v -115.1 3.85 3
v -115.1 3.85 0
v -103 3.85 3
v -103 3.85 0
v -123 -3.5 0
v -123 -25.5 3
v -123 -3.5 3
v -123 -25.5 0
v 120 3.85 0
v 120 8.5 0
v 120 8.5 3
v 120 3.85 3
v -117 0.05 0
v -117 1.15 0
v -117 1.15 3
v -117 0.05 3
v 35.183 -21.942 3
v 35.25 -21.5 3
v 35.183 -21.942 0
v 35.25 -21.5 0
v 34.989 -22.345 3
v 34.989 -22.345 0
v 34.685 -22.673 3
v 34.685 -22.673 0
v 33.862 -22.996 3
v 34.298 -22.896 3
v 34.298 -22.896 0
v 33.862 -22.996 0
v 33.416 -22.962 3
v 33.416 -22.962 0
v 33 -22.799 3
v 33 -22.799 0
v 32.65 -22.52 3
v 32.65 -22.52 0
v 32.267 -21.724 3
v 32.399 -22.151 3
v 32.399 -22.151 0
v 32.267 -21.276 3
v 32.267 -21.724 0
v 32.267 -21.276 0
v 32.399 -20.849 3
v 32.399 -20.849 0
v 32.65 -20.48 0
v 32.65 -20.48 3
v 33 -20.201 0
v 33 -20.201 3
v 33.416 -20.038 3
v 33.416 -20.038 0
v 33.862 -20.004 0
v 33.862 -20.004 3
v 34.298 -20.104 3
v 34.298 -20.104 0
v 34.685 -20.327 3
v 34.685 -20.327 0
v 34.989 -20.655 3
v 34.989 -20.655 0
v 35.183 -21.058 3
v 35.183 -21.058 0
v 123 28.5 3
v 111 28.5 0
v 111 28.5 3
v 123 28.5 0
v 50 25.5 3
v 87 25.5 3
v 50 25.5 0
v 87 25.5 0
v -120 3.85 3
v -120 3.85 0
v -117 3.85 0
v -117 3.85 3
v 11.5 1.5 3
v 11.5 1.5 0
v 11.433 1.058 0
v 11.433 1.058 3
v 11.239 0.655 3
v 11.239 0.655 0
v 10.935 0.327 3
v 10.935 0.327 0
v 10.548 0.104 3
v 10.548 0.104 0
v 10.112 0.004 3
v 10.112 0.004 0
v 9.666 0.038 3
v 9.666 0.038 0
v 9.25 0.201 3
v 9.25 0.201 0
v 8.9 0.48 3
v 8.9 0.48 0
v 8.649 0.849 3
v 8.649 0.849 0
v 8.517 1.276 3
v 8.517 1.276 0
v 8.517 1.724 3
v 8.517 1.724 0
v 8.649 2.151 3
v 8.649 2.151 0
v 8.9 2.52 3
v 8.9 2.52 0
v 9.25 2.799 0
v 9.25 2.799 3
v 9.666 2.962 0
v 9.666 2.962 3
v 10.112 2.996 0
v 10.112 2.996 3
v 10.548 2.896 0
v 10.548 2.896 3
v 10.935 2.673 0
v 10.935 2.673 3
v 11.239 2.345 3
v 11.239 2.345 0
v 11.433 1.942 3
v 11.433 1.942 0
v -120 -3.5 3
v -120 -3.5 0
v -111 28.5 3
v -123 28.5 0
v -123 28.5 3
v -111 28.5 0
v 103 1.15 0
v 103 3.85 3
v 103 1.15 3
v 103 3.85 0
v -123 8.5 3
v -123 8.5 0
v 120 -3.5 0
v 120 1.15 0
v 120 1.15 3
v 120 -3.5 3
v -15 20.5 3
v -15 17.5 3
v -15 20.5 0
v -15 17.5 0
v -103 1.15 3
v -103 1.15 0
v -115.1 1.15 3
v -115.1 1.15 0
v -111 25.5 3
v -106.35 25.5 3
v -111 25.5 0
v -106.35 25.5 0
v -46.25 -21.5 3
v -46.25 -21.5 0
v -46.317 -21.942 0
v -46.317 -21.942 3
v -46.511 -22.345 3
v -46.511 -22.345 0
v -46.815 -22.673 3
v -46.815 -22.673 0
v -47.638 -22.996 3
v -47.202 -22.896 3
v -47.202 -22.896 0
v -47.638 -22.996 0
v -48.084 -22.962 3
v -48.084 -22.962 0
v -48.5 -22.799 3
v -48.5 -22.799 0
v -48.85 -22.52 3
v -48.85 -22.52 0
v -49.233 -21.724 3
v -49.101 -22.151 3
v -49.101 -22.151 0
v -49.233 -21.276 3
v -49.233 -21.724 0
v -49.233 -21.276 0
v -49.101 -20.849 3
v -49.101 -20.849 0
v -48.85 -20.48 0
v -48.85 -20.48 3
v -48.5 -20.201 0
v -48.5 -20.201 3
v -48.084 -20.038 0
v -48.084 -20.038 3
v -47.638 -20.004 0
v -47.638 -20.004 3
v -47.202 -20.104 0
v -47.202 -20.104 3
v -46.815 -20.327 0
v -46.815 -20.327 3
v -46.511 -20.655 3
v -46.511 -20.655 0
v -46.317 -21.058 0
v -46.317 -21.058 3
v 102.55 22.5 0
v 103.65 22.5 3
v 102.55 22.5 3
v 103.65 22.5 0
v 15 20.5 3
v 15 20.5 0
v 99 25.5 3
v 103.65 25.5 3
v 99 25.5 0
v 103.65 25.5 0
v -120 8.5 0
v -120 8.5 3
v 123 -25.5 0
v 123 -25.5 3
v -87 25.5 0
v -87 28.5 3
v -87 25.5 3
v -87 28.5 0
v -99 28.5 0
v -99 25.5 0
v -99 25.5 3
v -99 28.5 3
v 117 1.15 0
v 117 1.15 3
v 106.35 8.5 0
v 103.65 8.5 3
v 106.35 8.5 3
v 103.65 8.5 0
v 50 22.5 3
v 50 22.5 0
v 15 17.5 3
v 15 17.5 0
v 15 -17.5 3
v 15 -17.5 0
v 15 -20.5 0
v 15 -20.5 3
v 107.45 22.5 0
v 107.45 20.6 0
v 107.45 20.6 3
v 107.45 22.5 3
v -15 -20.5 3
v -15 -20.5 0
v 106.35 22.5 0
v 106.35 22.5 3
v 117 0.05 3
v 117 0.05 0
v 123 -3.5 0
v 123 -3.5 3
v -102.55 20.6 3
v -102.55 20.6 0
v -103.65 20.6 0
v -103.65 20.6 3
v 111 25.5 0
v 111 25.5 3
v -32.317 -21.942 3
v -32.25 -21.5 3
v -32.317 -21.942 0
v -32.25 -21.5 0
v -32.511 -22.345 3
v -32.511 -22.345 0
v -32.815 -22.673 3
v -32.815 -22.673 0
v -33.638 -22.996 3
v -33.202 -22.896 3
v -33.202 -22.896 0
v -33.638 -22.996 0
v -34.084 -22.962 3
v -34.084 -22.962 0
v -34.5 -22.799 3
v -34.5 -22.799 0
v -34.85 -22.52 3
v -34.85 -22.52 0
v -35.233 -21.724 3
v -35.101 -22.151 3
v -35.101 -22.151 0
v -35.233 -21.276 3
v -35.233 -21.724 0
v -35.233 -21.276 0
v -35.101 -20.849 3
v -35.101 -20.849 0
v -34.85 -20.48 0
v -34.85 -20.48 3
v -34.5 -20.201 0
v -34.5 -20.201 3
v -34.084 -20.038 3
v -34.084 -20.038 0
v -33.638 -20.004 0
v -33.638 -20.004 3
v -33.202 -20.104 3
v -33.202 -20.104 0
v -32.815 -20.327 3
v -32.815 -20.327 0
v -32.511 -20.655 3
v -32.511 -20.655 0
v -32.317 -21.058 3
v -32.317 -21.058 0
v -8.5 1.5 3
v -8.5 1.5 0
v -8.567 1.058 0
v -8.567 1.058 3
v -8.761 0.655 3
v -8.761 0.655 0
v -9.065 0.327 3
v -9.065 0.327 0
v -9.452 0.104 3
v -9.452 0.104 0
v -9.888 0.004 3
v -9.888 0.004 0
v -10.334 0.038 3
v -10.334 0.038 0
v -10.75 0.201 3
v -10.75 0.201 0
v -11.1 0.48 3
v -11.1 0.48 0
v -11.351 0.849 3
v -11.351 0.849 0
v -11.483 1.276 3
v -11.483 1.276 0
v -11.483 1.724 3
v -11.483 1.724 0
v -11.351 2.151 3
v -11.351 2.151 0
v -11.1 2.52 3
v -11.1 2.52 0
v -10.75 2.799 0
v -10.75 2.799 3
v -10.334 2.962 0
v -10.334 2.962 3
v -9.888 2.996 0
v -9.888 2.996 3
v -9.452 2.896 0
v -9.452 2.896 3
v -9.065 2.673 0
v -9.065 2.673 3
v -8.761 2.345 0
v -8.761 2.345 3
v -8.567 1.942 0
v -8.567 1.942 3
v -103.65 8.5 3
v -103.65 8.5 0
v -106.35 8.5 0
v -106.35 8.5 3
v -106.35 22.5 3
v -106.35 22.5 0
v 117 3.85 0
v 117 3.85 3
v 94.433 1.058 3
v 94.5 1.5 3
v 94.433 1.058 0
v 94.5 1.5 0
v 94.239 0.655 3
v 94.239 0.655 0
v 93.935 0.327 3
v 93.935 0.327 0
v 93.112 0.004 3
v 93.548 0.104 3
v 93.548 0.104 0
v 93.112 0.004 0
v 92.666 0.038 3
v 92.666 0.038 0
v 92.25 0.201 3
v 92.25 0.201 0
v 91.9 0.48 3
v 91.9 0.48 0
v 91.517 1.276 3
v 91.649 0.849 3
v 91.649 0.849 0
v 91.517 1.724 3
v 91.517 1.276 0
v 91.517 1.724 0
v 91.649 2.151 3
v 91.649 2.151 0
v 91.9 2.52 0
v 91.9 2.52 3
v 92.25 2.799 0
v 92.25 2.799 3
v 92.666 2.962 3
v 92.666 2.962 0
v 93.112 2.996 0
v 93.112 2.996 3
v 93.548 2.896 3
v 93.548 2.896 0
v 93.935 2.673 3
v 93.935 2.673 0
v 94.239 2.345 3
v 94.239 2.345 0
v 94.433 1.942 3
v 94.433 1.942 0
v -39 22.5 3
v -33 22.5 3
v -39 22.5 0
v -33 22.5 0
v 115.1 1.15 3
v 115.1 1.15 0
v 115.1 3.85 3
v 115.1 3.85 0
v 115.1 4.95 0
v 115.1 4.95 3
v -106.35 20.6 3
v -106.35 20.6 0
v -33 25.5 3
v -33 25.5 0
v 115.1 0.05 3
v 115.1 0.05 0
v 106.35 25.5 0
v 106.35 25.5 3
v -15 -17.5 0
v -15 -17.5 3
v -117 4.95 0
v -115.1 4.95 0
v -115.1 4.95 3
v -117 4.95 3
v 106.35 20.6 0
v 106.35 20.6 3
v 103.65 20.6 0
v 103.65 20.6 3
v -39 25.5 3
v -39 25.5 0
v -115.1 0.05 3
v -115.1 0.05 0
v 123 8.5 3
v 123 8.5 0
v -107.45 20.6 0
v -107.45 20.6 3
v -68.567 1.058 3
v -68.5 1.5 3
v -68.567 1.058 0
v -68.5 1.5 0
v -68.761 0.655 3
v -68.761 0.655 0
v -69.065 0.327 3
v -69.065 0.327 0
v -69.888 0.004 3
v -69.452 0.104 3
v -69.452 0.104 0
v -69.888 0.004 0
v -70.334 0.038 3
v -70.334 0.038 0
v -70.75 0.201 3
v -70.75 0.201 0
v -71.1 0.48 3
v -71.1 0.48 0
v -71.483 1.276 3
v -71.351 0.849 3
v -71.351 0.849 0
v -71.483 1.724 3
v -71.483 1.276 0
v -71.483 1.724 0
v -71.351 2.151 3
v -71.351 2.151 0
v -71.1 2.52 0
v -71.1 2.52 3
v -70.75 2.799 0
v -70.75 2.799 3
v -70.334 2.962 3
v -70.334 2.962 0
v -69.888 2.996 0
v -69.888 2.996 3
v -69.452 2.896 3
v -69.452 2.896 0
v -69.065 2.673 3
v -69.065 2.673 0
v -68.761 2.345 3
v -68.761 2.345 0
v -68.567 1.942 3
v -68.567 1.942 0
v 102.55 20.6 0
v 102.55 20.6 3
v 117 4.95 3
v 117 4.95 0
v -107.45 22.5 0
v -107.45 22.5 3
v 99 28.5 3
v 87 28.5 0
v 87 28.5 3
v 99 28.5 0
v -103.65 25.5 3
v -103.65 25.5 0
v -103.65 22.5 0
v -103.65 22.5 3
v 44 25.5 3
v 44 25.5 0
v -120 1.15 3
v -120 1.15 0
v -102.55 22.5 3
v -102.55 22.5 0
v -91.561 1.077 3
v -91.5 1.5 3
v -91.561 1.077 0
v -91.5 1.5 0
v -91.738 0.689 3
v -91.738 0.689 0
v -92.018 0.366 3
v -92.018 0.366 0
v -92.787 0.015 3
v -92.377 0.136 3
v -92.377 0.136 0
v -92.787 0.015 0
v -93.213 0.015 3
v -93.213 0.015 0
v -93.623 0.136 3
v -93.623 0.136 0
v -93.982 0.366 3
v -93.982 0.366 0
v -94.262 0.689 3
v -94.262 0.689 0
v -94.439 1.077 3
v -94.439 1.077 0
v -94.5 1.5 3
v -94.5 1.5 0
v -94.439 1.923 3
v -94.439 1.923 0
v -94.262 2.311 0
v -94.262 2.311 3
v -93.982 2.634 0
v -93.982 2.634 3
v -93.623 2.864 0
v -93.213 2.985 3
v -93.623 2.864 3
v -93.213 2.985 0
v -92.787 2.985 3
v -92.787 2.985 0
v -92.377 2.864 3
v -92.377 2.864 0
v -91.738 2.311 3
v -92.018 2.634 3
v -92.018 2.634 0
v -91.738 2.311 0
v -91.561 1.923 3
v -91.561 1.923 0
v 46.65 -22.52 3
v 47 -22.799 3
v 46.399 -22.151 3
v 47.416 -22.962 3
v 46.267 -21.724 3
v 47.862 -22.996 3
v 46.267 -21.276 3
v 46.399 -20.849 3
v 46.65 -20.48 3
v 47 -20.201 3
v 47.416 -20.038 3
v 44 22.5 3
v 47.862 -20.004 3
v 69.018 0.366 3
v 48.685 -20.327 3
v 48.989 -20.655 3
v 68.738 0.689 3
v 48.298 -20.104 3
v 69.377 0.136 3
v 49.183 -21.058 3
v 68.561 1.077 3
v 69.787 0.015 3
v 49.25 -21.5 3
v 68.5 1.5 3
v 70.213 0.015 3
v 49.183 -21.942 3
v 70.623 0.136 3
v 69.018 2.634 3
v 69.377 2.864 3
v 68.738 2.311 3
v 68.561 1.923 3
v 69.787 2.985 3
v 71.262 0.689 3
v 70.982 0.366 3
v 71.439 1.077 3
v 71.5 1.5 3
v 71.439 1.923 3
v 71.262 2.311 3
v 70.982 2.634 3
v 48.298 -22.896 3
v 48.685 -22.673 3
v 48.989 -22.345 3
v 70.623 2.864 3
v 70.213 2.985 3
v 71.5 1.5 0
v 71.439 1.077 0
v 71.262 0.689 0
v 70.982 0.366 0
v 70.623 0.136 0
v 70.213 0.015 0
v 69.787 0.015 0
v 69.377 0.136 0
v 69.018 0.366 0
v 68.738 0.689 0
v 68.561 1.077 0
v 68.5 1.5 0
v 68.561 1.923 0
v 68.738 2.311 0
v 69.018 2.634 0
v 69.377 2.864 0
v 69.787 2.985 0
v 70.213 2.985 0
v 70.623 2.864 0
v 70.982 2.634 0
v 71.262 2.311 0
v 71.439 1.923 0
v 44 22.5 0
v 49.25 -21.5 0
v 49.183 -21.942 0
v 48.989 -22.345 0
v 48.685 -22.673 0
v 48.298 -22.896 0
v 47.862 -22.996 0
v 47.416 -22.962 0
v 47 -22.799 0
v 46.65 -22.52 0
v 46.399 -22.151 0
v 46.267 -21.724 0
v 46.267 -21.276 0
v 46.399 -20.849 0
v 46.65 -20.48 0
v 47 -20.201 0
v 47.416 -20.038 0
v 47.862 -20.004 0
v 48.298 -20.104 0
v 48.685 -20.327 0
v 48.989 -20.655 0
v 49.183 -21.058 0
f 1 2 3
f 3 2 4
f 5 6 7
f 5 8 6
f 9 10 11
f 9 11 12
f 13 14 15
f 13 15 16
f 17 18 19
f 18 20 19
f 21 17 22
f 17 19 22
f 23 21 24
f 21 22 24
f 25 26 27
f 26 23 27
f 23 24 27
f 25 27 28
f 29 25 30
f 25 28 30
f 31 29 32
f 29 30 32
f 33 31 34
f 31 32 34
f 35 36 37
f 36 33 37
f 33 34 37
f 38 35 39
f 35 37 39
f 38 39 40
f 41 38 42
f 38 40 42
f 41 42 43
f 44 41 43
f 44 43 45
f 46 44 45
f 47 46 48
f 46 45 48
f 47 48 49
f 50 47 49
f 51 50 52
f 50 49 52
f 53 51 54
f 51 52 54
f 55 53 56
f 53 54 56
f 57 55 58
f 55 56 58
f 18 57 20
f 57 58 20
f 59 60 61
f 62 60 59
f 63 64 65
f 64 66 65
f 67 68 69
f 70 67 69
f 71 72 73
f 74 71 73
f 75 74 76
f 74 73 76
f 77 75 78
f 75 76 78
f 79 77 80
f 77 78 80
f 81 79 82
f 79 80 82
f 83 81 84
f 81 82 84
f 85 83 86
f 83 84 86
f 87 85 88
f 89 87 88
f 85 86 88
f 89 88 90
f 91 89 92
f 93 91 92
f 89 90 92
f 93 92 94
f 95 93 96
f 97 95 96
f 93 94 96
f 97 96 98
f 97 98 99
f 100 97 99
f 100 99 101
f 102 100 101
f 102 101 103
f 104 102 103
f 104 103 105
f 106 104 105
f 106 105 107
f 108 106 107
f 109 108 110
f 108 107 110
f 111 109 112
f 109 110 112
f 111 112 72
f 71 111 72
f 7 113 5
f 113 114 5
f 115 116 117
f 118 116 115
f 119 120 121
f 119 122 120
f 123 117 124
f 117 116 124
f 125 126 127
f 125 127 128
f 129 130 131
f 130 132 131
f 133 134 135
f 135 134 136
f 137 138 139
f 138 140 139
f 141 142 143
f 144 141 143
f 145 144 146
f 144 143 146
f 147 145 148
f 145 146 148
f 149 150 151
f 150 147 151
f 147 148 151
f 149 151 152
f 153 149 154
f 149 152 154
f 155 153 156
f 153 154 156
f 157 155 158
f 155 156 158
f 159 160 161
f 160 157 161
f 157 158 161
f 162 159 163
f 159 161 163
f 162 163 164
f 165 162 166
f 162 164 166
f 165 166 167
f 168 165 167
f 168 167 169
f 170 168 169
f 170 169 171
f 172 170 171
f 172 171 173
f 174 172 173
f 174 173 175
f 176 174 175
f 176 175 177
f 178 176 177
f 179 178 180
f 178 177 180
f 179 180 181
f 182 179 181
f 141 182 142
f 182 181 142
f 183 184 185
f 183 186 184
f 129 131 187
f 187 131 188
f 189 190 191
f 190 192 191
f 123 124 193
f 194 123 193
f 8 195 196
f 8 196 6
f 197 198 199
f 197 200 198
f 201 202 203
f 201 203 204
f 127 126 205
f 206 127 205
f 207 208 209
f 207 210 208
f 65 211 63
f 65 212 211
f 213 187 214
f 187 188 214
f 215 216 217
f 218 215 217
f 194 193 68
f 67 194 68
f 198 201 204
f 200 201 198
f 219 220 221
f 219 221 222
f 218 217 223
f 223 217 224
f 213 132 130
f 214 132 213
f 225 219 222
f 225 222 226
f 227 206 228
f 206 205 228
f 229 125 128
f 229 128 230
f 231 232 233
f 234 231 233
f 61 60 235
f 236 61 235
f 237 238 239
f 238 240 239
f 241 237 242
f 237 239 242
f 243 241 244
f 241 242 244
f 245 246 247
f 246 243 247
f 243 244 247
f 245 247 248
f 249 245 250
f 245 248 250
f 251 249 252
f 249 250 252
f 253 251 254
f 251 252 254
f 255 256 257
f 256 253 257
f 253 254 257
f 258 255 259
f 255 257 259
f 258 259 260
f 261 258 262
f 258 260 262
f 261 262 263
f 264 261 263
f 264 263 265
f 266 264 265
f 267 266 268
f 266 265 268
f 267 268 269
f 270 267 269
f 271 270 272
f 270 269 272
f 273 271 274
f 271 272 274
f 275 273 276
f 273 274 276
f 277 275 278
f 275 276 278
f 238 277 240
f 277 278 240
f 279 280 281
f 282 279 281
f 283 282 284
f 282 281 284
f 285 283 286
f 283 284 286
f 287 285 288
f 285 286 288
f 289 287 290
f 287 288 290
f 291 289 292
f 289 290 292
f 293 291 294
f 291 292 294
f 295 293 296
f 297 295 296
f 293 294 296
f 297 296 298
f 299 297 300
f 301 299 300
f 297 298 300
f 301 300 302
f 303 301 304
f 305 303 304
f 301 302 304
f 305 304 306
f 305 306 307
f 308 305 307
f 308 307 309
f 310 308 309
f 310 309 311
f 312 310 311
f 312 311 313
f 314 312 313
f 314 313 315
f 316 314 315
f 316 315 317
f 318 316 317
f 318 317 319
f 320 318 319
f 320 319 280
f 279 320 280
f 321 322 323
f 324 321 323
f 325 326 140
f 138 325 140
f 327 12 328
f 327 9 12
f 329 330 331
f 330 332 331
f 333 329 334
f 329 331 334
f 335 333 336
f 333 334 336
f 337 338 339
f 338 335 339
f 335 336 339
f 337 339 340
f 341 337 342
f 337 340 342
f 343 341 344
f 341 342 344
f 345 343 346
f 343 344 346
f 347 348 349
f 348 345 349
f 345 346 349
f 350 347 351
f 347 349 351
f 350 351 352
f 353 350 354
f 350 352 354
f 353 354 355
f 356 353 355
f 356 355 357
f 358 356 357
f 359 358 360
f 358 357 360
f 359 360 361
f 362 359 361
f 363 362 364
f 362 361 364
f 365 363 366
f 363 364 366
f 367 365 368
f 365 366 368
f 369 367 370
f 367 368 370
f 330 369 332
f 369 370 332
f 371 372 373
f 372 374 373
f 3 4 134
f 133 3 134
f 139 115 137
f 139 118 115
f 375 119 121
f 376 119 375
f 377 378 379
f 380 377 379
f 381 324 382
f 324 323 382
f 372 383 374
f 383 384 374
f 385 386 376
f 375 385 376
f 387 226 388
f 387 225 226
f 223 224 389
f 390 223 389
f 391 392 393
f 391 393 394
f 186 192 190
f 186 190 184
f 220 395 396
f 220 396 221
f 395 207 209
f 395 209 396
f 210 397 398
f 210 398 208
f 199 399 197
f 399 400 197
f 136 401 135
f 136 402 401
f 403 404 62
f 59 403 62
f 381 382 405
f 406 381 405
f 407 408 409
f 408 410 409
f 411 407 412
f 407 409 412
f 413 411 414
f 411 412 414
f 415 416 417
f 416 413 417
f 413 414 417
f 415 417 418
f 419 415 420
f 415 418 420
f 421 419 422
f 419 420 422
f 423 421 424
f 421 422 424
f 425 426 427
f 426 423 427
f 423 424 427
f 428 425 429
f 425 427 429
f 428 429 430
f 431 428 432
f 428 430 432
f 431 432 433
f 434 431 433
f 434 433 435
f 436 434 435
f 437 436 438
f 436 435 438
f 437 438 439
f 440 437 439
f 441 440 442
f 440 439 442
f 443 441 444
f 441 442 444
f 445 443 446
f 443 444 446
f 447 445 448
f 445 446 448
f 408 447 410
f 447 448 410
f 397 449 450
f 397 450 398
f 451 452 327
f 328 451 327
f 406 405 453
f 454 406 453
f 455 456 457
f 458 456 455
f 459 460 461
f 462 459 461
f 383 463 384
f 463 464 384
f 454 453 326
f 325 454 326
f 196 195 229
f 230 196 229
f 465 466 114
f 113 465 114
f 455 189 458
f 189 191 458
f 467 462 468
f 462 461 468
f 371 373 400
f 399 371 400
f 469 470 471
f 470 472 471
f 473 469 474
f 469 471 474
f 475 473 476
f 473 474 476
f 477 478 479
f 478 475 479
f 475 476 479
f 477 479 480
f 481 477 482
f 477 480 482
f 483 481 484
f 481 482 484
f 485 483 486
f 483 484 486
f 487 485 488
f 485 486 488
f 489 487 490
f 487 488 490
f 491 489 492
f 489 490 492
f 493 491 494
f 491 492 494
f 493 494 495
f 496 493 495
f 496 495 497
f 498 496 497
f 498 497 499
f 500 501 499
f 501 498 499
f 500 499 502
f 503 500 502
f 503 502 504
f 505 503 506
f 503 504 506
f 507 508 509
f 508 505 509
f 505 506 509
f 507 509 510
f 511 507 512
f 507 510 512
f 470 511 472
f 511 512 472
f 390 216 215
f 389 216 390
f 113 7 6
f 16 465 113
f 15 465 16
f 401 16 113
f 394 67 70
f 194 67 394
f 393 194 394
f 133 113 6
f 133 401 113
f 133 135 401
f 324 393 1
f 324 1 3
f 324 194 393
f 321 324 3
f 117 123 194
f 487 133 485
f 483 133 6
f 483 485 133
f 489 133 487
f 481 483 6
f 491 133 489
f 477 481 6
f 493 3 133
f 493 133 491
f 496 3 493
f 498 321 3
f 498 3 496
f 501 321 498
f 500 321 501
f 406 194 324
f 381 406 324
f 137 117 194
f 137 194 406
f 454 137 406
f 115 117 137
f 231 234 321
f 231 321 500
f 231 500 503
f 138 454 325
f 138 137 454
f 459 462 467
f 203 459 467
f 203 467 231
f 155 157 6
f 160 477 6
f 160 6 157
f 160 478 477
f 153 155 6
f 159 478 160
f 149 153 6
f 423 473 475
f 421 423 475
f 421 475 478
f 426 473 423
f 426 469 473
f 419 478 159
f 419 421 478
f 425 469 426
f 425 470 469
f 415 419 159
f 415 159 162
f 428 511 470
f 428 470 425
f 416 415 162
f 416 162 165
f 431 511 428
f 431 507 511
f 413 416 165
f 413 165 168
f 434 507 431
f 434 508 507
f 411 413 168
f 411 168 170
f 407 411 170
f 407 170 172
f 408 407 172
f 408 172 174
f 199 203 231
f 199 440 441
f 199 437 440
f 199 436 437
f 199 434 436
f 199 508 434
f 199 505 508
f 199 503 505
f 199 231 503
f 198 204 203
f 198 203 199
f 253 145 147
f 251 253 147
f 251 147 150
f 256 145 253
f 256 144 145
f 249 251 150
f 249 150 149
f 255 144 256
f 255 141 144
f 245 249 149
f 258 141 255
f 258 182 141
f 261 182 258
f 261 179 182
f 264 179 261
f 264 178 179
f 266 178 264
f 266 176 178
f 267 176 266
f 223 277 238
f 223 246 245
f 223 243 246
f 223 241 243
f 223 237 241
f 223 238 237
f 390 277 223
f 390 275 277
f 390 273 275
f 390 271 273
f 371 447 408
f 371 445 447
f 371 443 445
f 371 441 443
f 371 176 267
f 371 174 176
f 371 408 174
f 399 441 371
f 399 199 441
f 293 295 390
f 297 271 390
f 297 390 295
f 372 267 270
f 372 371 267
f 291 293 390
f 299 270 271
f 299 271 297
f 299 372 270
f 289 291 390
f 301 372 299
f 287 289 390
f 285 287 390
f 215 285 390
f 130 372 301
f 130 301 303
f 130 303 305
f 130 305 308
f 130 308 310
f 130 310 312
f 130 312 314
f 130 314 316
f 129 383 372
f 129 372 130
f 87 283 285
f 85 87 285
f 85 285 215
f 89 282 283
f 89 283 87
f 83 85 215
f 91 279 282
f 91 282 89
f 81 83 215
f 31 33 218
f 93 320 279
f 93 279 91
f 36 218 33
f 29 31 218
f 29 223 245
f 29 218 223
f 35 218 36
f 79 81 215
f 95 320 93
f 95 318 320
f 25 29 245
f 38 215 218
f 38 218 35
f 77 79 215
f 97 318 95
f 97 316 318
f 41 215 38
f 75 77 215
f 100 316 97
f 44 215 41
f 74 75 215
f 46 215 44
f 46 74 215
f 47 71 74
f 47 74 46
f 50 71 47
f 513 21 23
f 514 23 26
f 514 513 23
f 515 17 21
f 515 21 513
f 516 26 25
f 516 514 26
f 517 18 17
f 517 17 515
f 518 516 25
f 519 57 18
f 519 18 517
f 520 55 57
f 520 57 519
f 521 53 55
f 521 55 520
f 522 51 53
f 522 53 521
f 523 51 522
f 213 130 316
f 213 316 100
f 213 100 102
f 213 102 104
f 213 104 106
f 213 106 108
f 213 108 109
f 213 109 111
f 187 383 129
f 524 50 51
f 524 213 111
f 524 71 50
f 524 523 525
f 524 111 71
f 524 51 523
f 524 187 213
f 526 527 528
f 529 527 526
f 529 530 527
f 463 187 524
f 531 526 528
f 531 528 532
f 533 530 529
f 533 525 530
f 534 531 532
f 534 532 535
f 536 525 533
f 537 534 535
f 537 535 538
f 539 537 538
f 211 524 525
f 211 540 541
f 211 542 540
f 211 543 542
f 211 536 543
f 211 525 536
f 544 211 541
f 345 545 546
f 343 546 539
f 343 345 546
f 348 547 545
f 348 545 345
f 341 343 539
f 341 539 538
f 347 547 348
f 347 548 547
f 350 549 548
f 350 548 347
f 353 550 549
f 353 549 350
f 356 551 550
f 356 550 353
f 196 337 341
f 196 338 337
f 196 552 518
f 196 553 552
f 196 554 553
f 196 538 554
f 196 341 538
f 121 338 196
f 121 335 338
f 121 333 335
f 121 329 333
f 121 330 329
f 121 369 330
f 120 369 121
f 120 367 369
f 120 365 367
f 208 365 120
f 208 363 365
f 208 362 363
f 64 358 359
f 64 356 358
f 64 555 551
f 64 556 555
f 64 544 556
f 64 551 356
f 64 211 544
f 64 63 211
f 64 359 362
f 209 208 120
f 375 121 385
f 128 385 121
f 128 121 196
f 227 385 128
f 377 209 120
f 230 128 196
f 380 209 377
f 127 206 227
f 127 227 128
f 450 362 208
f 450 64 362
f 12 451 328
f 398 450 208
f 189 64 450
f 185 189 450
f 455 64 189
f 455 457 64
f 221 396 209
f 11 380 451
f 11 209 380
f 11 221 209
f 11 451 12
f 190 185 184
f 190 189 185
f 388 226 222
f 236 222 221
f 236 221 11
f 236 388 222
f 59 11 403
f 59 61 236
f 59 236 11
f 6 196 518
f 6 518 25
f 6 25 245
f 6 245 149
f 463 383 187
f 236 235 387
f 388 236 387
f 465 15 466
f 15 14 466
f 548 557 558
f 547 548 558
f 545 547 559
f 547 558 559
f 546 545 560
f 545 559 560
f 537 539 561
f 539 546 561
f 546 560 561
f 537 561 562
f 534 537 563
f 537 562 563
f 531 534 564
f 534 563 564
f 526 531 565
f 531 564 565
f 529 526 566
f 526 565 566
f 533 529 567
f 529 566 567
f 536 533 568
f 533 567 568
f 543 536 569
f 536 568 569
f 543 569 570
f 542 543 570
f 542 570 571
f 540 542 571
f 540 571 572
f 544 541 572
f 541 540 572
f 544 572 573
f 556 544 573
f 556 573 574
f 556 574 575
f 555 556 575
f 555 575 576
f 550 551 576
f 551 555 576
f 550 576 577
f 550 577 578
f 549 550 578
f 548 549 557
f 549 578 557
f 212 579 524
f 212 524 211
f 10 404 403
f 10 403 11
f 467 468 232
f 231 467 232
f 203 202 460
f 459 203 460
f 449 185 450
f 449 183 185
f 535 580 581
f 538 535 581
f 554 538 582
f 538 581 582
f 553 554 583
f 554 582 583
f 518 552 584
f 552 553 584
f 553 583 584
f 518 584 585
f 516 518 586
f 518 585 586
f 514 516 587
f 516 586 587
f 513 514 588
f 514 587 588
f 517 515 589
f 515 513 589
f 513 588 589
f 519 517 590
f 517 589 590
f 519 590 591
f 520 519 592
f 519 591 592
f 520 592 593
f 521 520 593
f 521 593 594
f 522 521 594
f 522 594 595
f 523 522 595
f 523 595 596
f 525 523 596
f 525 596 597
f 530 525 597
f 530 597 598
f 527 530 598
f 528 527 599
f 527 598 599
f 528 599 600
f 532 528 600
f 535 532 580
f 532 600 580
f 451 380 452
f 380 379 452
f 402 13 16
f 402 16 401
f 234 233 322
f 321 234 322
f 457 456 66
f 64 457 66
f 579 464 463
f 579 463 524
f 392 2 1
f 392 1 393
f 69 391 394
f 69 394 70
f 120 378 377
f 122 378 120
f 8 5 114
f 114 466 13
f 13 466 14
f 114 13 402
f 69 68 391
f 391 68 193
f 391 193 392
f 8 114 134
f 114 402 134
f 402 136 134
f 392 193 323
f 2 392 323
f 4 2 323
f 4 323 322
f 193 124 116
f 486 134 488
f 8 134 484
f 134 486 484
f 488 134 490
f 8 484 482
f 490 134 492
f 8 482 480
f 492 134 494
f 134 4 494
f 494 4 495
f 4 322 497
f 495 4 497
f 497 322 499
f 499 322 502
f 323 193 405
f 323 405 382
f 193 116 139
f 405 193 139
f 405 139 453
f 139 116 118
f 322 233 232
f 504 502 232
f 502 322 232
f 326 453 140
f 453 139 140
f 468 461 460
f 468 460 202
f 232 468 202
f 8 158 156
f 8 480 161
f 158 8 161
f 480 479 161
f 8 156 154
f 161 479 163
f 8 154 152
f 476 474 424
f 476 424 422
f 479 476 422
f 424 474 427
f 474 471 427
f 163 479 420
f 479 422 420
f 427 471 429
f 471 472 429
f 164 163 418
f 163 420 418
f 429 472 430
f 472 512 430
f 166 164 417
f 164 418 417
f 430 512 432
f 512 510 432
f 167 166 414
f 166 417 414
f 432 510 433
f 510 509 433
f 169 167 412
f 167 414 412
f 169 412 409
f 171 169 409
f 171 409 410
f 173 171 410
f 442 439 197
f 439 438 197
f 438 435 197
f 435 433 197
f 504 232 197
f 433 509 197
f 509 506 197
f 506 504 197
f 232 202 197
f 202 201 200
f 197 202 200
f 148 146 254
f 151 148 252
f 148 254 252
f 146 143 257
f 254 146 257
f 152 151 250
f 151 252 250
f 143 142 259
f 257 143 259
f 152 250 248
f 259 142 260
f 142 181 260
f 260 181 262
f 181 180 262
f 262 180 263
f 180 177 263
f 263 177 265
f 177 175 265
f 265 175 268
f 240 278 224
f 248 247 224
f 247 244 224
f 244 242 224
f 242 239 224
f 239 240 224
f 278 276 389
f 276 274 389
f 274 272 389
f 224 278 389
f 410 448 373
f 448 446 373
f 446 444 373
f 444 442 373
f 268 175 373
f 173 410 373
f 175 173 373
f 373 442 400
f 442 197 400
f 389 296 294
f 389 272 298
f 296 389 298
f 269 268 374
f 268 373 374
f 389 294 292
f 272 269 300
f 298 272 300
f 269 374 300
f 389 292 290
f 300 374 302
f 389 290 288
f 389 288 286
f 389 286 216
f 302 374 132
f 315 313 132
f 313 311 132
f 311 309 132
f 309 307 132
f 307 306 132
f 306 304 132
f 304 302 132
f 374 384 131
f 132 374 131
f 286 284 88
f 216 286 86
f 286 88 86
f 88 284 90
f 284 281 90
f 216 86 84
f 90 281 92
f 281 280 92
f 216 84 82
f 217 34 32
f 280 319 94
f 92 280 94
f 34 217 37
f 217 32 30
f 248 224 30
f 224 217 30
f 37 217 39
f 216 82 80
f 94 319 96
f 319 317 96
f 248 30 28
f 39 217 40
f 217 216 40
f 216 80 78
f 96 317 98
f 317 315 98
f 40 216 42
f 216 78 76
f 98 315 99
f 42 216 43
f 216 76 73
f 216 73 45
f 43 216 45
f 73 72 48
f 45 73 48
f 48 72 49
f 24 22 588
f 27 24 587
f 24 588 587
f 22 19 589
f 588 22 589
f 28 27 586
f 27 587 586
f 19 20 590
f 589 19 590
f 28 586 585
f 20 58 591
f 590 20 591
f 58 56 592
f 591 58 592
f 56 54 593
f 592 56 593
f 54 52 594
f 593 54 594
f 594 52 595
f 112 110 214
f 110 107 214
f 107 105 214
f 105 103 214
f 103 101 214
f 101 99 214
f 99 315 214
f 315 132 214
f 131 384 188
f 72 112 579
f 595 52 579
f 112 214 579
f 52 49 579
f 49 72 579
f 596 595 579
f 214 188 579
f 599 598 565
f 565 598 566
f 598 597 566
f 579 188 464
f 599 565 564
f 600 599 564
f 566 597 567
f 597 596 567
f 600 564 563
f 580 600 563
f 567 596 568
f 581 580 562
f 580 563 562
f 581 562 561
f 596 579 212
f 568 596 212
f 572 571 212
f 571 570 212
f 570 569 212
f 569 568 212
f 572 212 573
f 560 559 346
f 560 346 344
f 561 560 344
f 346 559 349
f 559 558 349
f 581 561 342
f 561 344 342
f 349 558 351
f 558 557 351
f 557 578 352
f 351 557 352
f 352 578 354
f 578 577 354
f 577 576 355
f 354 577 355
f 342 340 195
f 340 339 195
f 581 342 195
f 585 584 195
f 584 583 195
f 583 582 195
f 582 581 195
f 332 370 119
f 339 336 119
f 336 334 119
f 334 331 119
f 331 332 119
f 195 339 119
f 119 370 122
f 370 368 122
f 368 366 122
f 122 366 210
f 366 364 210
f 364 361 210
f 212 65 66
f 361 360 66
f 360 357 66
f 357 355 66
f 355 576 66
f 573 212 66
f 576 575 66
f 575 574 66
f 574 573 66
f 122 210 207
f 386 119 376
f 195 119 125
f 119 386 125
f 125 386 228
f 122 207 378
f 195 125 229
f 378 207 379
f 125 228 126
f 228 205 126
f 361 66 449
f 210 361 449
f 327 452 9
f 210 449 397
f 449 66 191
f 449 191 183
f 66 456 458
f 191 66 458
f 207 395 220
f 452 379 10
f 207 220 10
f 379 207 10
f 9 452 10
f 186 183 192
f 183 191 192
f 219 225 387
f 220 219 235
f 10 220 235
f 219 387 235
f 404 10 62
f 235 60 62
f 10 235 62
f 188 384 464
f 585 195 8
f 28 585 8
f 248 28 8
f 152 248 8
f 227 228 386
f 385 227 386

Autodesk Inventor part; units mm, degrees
ref_plane "YZ Plane" through (0, 0, 0) normal (1, 0, 0) x (0, 1, 0)
ref_plane "XZ Plane" through (0, 0, 0) normal (0, 1, 0) x (-1, 0, 0)
ref_plane "XY Plane" through (0, 0, 0) normal (0, 0, 1) x (1, 0, 0)
sketch "Эскиз1" plane through (0, 0, 0) normal (0, 0, 1) x (1, 0, 0)
  line L0 (125, -28.5) -> (-125, -28.5)
  line L1 (-125, -28.5) -> (-125, 28.5)
  line L2 (-125, 28.5) -> (125, 28.5)
  line L3 (125, 28.5) -> (125, -28.5)
  line L4 (125, -28.5) -> (-125, 28.5) construction
  line L5 (-125, -28.5) -> (125, 28.5) construction
  line L6 (-125, 28.5) -> (125, 28.5)
  line L7 (125, 11.5) -> (-125, 11.5)
  line L8 (-125, 11.5) -> (-125, 28.5)
  line L9 (-125, 11.5) -> (125, 11.5)
  line L10 (125, 11.5) -> (125, -8.5)
  line L11 (125, -8.5) -> (-125, -8.5)
  line L12 (-125, -8.5) -> (-125, 11.5)
  line L13 (-125, -8.5) -> (125, -8.5)
  line L14 (125, -8.5) -> (125, -25.5)
  line L15 (125, -25.5) -> (-125, -25.5)
  line L16 (-125, -25.5) -> (-125, -8.5)
  line L17 (-125, 28.5) -> (125, 28.5)
  line L18 (125, 25.5) -> (-125, 25.5)
  line L19 (-125, 25.5) -> (-125, 28.5)
  line L20 (-125, 28.5) -> (-111, 28.5)
  line L21 (-111, 28.5) -> (-111, 25.5)
  line L22 (-111, 25.5) -> (-125, 25.5)
  line L23 (-125, 25.5) -> (-125, 28.5)
  line L24 (-111, 25.5) -> (-99, 25.5)
  line L25 (-99, 25.5) -> (-99, 28.5)
  line L26 (-99, 28.5) -> (-111, 28.5)
  line L27 (-111, 28.5) -> (-111, 25.5)
  line L28 (-99, 28.5) -> (-87, 28.5)
  line L29 (-87, 28.5) -> (-87, 25.5)
  line L30 (-87, 25.5) -> (-99, 25.5)
  line L31 (-99, 25.5) -> (-99, 28.5)
  line L32 (-111, 28.5) -> (-106.35, 28.5)
  line L33 (-106.35, 28.5) -> (-103.65, 28.5)
  line L34 (-103.65, 28.5) -> (-103.65, 8.5)
  line L35 (-103.65, 8.5) -> (-106.35, 8.5)
  line L36 (-106.35, 8.5) -> (-106.35, 28.5)
  line L37 (-106.35, 25.5) -> (-107.45, 25.5)
  line L38 (-107.45, 22.5) -> (-106.35, 22.5)
  line L39 (-106.35, 22.5) -> (-106.35, 25.5)
  line L40 (-107.45, 22.5) -> (-102.55, 22.5)
  line L41 (-102.55, 22.5) -> (-102.55, 20.6)
  line L42 (-102.55, 20.6) -> (-107.45, 20.6)
  line L43 (-107.45, 20.6) -> (-107.45, 22.5)
  line L44 (125, -28.5) -> (125, 28.5)
  line L45 (111, 28.5) -> (111, 25.5)
  line L46 (99, 25.5) -> (99, 28.5)
  line L47 (87, 28.5) -> (87, 25.5)
  line L48 (103.65, 28.5) -> (103.65, 8.5)
  line L49 (103.65, 8.5) -> (106.35, 8.5)
  line L50 (106.35, 8.5) -> (106.35, 28.5)
  line L51 (106.35, 22.5) -> (106.35, 25.5)
  line L52 (107.45, 22.5) -> (102.55, 22.5)
  line L53 (102.55, 22.5) -> (102.55, 20.6)
  line L54 (102.55, 20.6) -> (107.45, 20.6)
  line L55 (107.45, 20.6) -> (107.45, 22.5)
  line L56 (-125, 11.5) -> (-96, 11.5)
  line L57 (-96, 11.5) -> (-96, -8.5)
  line L58 (-96, -8.5) -> (-125, -8.5)
  line L59 (-125, -8.5) -> (-125, 11.5)
  line L60 (-96, -8.5) -> (-67, -8.5)
  line L61 (-67, -8.5) -> (-67, 11.5)
  line L62 (-67, 11.5) -> (-96, 11.5)
  line L63 (-96, 11.5) -> (-96, -8.5)
  line L64 (-96, 1.5) -> (-93, 1.5)
  line L65 (-67, 1.5) -> (-70, 1.5)
  circle A0 centre (-70, 1.5) radius 1.5
  circle A1 centre (-93, 1.5) radius 1.5
  circle A2 centre (70, 1.5) radius 1.5
  circle A3 centre (93, 1.5) radius 1.5
  line L66 (-125, 28.5) -> (-122, 28.5)
  line L67 (-126, 8.5) -> (-125, 28.5)
  line L68 (-126, -3.5) -> (-126, 8.5)
  line L69 (-126, 1.15) -> (-126, 3.85)
  line L70 (-125, 28.5) -> (-123, 28.5)
  line L71 (-123, 28.5) -> (-123, 8.5)
  line L72 (-123, 8.5) -> (-125, 8.5)
  line L73 (-125, 8.5) -> (-125, 28.5)
  line L74 (-123, 8.5) -> (-126, 8.5)
  line L75 (-126, 8.5) -> (-126, -3.5)
  line L76 (-126, -3.5) -> (-123, -3.5)
  line L77 (-123, -3.5) -> (-123, 8.5)
  line L78 (-123, 28.5) -> (-120, 28.5)
  line L79 (-120, 28.5) -> (-120, -3.5)
  line L80 (-120, -3.5) -> (-123, -3.5)
  line L81 (-123, -3.5) -> (-123, 28.5)
  line L82 (-123, 8.5) -> (-120, 8.5)
  line L83 (-120, 8.5) -> (-120, -3.5)
  line L84 (-120, -3.5) -> (-123, -3.5)
  line L85 (-123, -3.5) -> (-123, 8.5)
  line L86 (-123, 8.5) -> (-123, 3.85)
  line L87 (-123, 3.85) -> (-103, 3.85)
  line L88 (-103, 3.85) -> (-103, 1.15)
  line L89 (-103, 1.15) -> (-123, 1.15)
  line L90 (-123, 1.15) -> (-123, 3.85)
  line L91 (-120, 1.15) -> (-117, 1.15)
  line L92 (-117, 1.15) -> (-117, 0.05)
  line L93 (-117, 0.05) -> (-120, 0.05)
  line L94 (-120, 0.05) -> (-120, 1.15)
  line L95 (-117, 0.05) -> (-115.1, 0.05)
  line L96 (-115.1, 0.05) -> (-115.1, 4.95)
  line L97 (-115.1, 4.95) -> (-117, 4.95)
  line L98 (-117, 4.95) -> (-117, 0.05)
  line L99 (123, 3.85) -> (103, 3.85)
  line L100 (103, 3.85) -> (103, 1.15)
  line L101 (103, 1.15) -> (123, 1.15)
  line L102 (120, 1.15) -> (117, 1.15)
  line L103 (117, 0.05) -> (115.1, 0.05)
  line L104 (115.1, 0.05) -> (115.1, 4.95)
  line L105 (115.1, 4.95) -> (117, 4.95)
  line L106 (117, 4.95) -> (117, 0.05)
  line L107 (126, -3.5) -> (123, -3.5)
  line L108 (120, 28.5) -> (120, -3.5)
  line L109 (120, -3.5) -> (123, -3.5)
  line L110 (123, -3.5) -> (123, 28.5)
  line L111 (123, 8.5) -> (125, 8.5)
  line L112 (123, 8.5) -> (120, 8.5)
  line L113 (-123, -3.5) -> (-125, -3.5)
  line L114 (-125, -3.5) -> (-125, -28.5)
  line L115 (-125, -28.5) -> (-123, -28.5)
  line L116 (-123, -28.5) -> (-123, -3.5)
  line L117 (123, -3.5) -> (125, -3.5)
  line L118 (125, -3.5) -> (125, -28.5)
  line L119 (125, -28.5) -> (123, -28.5)
  line L120 (123, -28.5) -> (123, -3.5)
  line L121 (-67, -8.5) -> (-14.5, -8.5)
  line L122 (-14.5, -28.5) -> (-67, -28.5)
  line L123 (-40.75, -28.5) -> (-33.75, -28.5)
  circle A4 centre (-33.75, -21.5) radius 1.5
  circle A5 centre (-47.75, -21.5) radius 1.5
  circle A6 centre (33.75, -21.5) radius 1.5
  circle A7 centre (47.75, -21.5) radius 1.5
  line L124 (-33.75, -25.5) -> (-47.75, -25.5)
  line L125 (-47.75, -28.5) -> (-33.75, -28.5)
  line L126 (-40.75, -28.5) -> (-28.75, -28.5)
  line L127 (-28.75, -28.5) -> (-28.75, -25.5)
  line L128 (-28.75, -25.5) -> (-40.75, -25.5)
  line L129 (-40.75, -28.5) -> (-52.75, -28.5)
  line L130 (-52.75, -28.5) -> (-52.75, -25.5)
  line L131 (-52.75, -25.5) -> (-40.75, -25.5)
  line L132 (-40.75, -25.5) -> (-40.75, -28.5)
  line L133 (28.75, -28.5) -> (28.75, -25.5)
  line L134 (52.75, -28.5) -> (52.75, -25.5)
  line L135 (52.5, -17.5) -> (-52.5, -17.5)
  line L136 (-52.5, -17.5) -> (-52.5, 17.5)
  line L137 (-52.5, 17.5) -> (52.5, 17.5)
  line L138 (52.5, 17.5) -> (52.5, -17.5)
  line L139 (52.5, -17.5) -> (-52.5, 17.5) construction
  line L140 (-52.5, -17.5) -> (52.5, 17.5) construction
  line L141 (15, 14.5) -> (-15, 14.5)
  line L142 (-15, 14.5) -> (-15, 20.5)
  line L143 (-15, 20.5) -> (15, 20.5)
  line L144 (15, 20.5) -> (15, 14.5)
  line L145 (15, 14.5) -> (-15, 20.5) construction
  line L146 (-15, 14.5) -> (15, 20.5) construction
  line L147 (15, -20.5) -> (-15, -20.5)
  line L148 (-15, -20.5) -> (-15, -14.5)
  line L149 (-15, -14.5) -> (15, -14.5)
  line L150 (15, -14.5) -> (15, -20.5)
  line L151 (15, -20.5) -> (-15, -14.5) construction
  line L152 (-15, -20.5) -> (15, -14.5) construction
  line L153 (0, 0) -> (-36, 0)
  line L154 (-36, 0) -> (-36, 28.5)
  line L155 (-36, 28.5) -> (0, 28.5)
  line L156 (0, 28.5) -> (0, 0)
  line L157 (0, 0) -> (47, 0)
  line L158 (47, 0) -> (47, 28.5)
  line L159 (47, 28.5) -> (0, 28.5)
  line L160 (0, 28.5) -> (0, 0)
  line L161 (-36, 28.5) -> (-33, 28.5)
  line L162 (-33, 28.5) -> (-33, 25.5)
  line L163 (-33, 25.5) -> (-36, 25.5)
  line L164 (-36, 25.5) -> (-36, 28.5)
  line L165 (-36, 28.5) -> (-39, 28.5)
  line L166 (-39, 28.5) -> (-39, 25.5)
  line L167 (-39, 25.5) -> (-36, 25.5)
  line L168 (-36, 25.5) -> (-36, 28.5)
  line L169 (47, 28.5) -> (44, 28.5)
  line L170 (44, 28.5) -> (44, 25.5)
  line L171 (44, 25.5) -> (47, 25.5)
  line L172 (47, 25.5) -> (47, 28.5)
  line L173 (47, 28.5) -> (50, 28.5)
  line L174 (50, 28.5) -> (50, 25.5)
  line L175 (50, 25.5) -> (47, 25.5)
  line L176 (47, 25.5) -> (47, 28.5)
  line L177 (-39, 25.5) -> (-33, 25.5)
  line L178 (-33, 25.5) -> (-33, 22.5)
  line L179 (-33, 22.5) -> (-39, 22.5)
  line L180 (-39, 22.5) -> (-39, 25.5)
  line L181 (50, 25.5) -> (44, 25.5)
  line L182 (44, 25.5) -> (44, 22.5)
  line L183 (44, 22.5) -> (50, 22.5)
  line L184 (50, 22.5) -> (50, 25.5)
  line L185 (-70, 1.5) -> (70, 1.5)
  line L186 (0, 1.5) -> (10, 1.5)
  line L187 (10, 1.5) -> (-10, 1.5)
  circle A8 centre (-10, 1.5) radius 1.5
  circle A9 centre (10, 1.5) radius 1.5
  point P0 (106.35, 20.6)
  point P1 (103.65, 20.6)
  point P2 (103.65, 22.5)
  point P3 (103.65, 25.5)
  point P4 (-103.65, 25.5)
  point P5 (-103.65, 22.5)
  point P6 (-103.65, 20.6)
  point P7 (-106.35, 20.6)
  point P8 (106.35, 11.5)
  point P9 (103.65, 11.5)
  point P10 (-103.65, 11.5)
  point P11 (-106.35, 11.5)
  point P12 (-120, 3.85)
  point P13 (-117, 3.85)
  point P14 (-115.1, 3.85)
  point P15 (-115.1, 1.15)
  point P16 (-117, 1.15)
  point P17 (-120, 1.15)
  point P18 (115.1, 1.15)
  point P19 (115.1, 3.85)
  point P20 (117, 3.85)
  point P21 (120, 3.85)
  point P22 (120, 11.5)
  point P23 (-123, -28.5)
  point P24 (123, 28.5)
  point P25 (0, 17.5)
  point P26 (0, -17.5)
  point P27 (-15, 17.5)
  point P28 (15, 17.5)
  point P29 (-15, -17.5)
  point P30 (15, -17.5)
  point P31 (-123, -25.5)
  point P32 (123, -25.5)
  dimension "d0" = 250
  dimension "d1" = 57
  dimension "d2" = 17
  dimension "d3" = 20
  dimension "d4" = 17
  dimension "d8" = 3
  dimension "d9" = 14
  dimension "d10" = 12
  dimension "d11" = 12
  dimension "d12" = 4.65
  dimension "d14" = 20
  dimension "d15" = 1.1
  dimension "d16" = 3
  dimension "d17" = 4.9
  dimension "d18" = 1.9
  dimension "d23" = 29
  dimension "d24" = 29
  dimension "d25" = 3
  dimension "d26" = 3
  dimension "d27" = 3
  dimension "d31" = 4.65
  dimension "d37" = 2
  dimension "d38" = 20
  dimension "d39" = 12
  dimension "d40" = 3
  dimension "d41" = 20
  dimension "d42" = 2.7
  dimension "d43" = 3
  dimension "d44" = 1.1
  dimension "d45" = 1.9
  dimension "d46" = 4.9
  dimension "d49" = 3
  dimension "d50" = 12
  dimension "d51" = 12
  dimension "d52" = 105
  dimension "d53" = 35
  dimension "d54" = 30
  dimension "d55" = 6
  dimension "d56" = 30
  dimension "d57" = 6
  dimension "d58" = 33.75
  dimension "d59" = 36
  dimension "d60" = 47
  dimension "d61" = 3
  dimension "d62" = 3
  dimension "d63" = 3
  dimension "d64" = 3
  dimension "d65" = 96
  dimension "d66" = 10
  dimension "d67" = 20
  dimension "d68" = 3
  dimension "d69" = 3
extrude "Выдавливание1" add sketch "Эскиз1" along normal blind 3 contours L15 L116 L11 L136 L135 L148 L147 L150 L138 L120 | L11 L138 L7 L48 L49 L50 L108 L99 L106 L105 L104 L100 L101 L103 L109 L120 | L138 L135 L150 L149 L148 L136 L11 | L11 L136 L185 L154 L153 L157 L158 L138 | L185 L158 L7 L138 | L112 L108 L7 L110 | L11 L61 L185 L136 | L138 L137 L158 L183 L184 L18 L48 L52 L53 L54 L7 | L7 L158 L137 L138 | L185 A9 L156 L7 L158 | L158 L157 A9 L185 | L135 L148 L149 L150 | L7 L108 L18 L110 | L11 L57 L7 L61 | L185 L61 L7 L136 | L136 L7 L154 L185 | L7 L156 L141 L144 L137 L158 | L18 L108 L2 L110 | L7 L50 L54 L55 L52 L18 L108 | L11 L116 L80 L79 L93 L95 L96 L89 L88 L87 L97 L98 L7 L36 L35 L34 L57 | L136 L137 L154 L7 | L7 L34 L42 L41 L40 L18 L180 L179 L154 L137 L136 | L185 A8 L153 L154 | L154 L7 L156 L185 A8 | L7 L154 L137 L142 L141 L156 | L137 L144 L143 L156 L18 L182 L183 L158 | L157 L156 L185 A9 | L18 L45 L2 L108 | L156 L137 L144 L141 | L141 L142 L137 L156 | L156 L153 A8 L185 | L154 L179 L178 L18 L156 L143 L142 L137 | L18 L47 L2 L46 | L89 L92 L93 L79 | L7 L79 L18 L36 L38 L43 L42 | L71 L7 L79 L82 | L7 L71 L18 L79 | L79 L2 L21 L18 | L18 L71 L2 L79 | L18 L25 L2 L29
equation "\"Радиус_гибки\" = Толщина"
equation "\"Ширина_просечки\" = Толщина"
equation "\"Глубина_просечки\" = 0.5 * Толщина"
equation "\"Размер_просечки\" = 4 * Толщина"
equation "\"Мин_остаток\" = 2 * Толщина"
equation "\"Радиус_перехода\" = Радиус_гибки"
equation "\"Радиус_Якоби\" = Радиус_гибки"
equation "\"Размер_зазора\" = Толщина"
equation "\"Толщина\" = 0.5"
properties part number "зад" material "Дерево (орех)"
